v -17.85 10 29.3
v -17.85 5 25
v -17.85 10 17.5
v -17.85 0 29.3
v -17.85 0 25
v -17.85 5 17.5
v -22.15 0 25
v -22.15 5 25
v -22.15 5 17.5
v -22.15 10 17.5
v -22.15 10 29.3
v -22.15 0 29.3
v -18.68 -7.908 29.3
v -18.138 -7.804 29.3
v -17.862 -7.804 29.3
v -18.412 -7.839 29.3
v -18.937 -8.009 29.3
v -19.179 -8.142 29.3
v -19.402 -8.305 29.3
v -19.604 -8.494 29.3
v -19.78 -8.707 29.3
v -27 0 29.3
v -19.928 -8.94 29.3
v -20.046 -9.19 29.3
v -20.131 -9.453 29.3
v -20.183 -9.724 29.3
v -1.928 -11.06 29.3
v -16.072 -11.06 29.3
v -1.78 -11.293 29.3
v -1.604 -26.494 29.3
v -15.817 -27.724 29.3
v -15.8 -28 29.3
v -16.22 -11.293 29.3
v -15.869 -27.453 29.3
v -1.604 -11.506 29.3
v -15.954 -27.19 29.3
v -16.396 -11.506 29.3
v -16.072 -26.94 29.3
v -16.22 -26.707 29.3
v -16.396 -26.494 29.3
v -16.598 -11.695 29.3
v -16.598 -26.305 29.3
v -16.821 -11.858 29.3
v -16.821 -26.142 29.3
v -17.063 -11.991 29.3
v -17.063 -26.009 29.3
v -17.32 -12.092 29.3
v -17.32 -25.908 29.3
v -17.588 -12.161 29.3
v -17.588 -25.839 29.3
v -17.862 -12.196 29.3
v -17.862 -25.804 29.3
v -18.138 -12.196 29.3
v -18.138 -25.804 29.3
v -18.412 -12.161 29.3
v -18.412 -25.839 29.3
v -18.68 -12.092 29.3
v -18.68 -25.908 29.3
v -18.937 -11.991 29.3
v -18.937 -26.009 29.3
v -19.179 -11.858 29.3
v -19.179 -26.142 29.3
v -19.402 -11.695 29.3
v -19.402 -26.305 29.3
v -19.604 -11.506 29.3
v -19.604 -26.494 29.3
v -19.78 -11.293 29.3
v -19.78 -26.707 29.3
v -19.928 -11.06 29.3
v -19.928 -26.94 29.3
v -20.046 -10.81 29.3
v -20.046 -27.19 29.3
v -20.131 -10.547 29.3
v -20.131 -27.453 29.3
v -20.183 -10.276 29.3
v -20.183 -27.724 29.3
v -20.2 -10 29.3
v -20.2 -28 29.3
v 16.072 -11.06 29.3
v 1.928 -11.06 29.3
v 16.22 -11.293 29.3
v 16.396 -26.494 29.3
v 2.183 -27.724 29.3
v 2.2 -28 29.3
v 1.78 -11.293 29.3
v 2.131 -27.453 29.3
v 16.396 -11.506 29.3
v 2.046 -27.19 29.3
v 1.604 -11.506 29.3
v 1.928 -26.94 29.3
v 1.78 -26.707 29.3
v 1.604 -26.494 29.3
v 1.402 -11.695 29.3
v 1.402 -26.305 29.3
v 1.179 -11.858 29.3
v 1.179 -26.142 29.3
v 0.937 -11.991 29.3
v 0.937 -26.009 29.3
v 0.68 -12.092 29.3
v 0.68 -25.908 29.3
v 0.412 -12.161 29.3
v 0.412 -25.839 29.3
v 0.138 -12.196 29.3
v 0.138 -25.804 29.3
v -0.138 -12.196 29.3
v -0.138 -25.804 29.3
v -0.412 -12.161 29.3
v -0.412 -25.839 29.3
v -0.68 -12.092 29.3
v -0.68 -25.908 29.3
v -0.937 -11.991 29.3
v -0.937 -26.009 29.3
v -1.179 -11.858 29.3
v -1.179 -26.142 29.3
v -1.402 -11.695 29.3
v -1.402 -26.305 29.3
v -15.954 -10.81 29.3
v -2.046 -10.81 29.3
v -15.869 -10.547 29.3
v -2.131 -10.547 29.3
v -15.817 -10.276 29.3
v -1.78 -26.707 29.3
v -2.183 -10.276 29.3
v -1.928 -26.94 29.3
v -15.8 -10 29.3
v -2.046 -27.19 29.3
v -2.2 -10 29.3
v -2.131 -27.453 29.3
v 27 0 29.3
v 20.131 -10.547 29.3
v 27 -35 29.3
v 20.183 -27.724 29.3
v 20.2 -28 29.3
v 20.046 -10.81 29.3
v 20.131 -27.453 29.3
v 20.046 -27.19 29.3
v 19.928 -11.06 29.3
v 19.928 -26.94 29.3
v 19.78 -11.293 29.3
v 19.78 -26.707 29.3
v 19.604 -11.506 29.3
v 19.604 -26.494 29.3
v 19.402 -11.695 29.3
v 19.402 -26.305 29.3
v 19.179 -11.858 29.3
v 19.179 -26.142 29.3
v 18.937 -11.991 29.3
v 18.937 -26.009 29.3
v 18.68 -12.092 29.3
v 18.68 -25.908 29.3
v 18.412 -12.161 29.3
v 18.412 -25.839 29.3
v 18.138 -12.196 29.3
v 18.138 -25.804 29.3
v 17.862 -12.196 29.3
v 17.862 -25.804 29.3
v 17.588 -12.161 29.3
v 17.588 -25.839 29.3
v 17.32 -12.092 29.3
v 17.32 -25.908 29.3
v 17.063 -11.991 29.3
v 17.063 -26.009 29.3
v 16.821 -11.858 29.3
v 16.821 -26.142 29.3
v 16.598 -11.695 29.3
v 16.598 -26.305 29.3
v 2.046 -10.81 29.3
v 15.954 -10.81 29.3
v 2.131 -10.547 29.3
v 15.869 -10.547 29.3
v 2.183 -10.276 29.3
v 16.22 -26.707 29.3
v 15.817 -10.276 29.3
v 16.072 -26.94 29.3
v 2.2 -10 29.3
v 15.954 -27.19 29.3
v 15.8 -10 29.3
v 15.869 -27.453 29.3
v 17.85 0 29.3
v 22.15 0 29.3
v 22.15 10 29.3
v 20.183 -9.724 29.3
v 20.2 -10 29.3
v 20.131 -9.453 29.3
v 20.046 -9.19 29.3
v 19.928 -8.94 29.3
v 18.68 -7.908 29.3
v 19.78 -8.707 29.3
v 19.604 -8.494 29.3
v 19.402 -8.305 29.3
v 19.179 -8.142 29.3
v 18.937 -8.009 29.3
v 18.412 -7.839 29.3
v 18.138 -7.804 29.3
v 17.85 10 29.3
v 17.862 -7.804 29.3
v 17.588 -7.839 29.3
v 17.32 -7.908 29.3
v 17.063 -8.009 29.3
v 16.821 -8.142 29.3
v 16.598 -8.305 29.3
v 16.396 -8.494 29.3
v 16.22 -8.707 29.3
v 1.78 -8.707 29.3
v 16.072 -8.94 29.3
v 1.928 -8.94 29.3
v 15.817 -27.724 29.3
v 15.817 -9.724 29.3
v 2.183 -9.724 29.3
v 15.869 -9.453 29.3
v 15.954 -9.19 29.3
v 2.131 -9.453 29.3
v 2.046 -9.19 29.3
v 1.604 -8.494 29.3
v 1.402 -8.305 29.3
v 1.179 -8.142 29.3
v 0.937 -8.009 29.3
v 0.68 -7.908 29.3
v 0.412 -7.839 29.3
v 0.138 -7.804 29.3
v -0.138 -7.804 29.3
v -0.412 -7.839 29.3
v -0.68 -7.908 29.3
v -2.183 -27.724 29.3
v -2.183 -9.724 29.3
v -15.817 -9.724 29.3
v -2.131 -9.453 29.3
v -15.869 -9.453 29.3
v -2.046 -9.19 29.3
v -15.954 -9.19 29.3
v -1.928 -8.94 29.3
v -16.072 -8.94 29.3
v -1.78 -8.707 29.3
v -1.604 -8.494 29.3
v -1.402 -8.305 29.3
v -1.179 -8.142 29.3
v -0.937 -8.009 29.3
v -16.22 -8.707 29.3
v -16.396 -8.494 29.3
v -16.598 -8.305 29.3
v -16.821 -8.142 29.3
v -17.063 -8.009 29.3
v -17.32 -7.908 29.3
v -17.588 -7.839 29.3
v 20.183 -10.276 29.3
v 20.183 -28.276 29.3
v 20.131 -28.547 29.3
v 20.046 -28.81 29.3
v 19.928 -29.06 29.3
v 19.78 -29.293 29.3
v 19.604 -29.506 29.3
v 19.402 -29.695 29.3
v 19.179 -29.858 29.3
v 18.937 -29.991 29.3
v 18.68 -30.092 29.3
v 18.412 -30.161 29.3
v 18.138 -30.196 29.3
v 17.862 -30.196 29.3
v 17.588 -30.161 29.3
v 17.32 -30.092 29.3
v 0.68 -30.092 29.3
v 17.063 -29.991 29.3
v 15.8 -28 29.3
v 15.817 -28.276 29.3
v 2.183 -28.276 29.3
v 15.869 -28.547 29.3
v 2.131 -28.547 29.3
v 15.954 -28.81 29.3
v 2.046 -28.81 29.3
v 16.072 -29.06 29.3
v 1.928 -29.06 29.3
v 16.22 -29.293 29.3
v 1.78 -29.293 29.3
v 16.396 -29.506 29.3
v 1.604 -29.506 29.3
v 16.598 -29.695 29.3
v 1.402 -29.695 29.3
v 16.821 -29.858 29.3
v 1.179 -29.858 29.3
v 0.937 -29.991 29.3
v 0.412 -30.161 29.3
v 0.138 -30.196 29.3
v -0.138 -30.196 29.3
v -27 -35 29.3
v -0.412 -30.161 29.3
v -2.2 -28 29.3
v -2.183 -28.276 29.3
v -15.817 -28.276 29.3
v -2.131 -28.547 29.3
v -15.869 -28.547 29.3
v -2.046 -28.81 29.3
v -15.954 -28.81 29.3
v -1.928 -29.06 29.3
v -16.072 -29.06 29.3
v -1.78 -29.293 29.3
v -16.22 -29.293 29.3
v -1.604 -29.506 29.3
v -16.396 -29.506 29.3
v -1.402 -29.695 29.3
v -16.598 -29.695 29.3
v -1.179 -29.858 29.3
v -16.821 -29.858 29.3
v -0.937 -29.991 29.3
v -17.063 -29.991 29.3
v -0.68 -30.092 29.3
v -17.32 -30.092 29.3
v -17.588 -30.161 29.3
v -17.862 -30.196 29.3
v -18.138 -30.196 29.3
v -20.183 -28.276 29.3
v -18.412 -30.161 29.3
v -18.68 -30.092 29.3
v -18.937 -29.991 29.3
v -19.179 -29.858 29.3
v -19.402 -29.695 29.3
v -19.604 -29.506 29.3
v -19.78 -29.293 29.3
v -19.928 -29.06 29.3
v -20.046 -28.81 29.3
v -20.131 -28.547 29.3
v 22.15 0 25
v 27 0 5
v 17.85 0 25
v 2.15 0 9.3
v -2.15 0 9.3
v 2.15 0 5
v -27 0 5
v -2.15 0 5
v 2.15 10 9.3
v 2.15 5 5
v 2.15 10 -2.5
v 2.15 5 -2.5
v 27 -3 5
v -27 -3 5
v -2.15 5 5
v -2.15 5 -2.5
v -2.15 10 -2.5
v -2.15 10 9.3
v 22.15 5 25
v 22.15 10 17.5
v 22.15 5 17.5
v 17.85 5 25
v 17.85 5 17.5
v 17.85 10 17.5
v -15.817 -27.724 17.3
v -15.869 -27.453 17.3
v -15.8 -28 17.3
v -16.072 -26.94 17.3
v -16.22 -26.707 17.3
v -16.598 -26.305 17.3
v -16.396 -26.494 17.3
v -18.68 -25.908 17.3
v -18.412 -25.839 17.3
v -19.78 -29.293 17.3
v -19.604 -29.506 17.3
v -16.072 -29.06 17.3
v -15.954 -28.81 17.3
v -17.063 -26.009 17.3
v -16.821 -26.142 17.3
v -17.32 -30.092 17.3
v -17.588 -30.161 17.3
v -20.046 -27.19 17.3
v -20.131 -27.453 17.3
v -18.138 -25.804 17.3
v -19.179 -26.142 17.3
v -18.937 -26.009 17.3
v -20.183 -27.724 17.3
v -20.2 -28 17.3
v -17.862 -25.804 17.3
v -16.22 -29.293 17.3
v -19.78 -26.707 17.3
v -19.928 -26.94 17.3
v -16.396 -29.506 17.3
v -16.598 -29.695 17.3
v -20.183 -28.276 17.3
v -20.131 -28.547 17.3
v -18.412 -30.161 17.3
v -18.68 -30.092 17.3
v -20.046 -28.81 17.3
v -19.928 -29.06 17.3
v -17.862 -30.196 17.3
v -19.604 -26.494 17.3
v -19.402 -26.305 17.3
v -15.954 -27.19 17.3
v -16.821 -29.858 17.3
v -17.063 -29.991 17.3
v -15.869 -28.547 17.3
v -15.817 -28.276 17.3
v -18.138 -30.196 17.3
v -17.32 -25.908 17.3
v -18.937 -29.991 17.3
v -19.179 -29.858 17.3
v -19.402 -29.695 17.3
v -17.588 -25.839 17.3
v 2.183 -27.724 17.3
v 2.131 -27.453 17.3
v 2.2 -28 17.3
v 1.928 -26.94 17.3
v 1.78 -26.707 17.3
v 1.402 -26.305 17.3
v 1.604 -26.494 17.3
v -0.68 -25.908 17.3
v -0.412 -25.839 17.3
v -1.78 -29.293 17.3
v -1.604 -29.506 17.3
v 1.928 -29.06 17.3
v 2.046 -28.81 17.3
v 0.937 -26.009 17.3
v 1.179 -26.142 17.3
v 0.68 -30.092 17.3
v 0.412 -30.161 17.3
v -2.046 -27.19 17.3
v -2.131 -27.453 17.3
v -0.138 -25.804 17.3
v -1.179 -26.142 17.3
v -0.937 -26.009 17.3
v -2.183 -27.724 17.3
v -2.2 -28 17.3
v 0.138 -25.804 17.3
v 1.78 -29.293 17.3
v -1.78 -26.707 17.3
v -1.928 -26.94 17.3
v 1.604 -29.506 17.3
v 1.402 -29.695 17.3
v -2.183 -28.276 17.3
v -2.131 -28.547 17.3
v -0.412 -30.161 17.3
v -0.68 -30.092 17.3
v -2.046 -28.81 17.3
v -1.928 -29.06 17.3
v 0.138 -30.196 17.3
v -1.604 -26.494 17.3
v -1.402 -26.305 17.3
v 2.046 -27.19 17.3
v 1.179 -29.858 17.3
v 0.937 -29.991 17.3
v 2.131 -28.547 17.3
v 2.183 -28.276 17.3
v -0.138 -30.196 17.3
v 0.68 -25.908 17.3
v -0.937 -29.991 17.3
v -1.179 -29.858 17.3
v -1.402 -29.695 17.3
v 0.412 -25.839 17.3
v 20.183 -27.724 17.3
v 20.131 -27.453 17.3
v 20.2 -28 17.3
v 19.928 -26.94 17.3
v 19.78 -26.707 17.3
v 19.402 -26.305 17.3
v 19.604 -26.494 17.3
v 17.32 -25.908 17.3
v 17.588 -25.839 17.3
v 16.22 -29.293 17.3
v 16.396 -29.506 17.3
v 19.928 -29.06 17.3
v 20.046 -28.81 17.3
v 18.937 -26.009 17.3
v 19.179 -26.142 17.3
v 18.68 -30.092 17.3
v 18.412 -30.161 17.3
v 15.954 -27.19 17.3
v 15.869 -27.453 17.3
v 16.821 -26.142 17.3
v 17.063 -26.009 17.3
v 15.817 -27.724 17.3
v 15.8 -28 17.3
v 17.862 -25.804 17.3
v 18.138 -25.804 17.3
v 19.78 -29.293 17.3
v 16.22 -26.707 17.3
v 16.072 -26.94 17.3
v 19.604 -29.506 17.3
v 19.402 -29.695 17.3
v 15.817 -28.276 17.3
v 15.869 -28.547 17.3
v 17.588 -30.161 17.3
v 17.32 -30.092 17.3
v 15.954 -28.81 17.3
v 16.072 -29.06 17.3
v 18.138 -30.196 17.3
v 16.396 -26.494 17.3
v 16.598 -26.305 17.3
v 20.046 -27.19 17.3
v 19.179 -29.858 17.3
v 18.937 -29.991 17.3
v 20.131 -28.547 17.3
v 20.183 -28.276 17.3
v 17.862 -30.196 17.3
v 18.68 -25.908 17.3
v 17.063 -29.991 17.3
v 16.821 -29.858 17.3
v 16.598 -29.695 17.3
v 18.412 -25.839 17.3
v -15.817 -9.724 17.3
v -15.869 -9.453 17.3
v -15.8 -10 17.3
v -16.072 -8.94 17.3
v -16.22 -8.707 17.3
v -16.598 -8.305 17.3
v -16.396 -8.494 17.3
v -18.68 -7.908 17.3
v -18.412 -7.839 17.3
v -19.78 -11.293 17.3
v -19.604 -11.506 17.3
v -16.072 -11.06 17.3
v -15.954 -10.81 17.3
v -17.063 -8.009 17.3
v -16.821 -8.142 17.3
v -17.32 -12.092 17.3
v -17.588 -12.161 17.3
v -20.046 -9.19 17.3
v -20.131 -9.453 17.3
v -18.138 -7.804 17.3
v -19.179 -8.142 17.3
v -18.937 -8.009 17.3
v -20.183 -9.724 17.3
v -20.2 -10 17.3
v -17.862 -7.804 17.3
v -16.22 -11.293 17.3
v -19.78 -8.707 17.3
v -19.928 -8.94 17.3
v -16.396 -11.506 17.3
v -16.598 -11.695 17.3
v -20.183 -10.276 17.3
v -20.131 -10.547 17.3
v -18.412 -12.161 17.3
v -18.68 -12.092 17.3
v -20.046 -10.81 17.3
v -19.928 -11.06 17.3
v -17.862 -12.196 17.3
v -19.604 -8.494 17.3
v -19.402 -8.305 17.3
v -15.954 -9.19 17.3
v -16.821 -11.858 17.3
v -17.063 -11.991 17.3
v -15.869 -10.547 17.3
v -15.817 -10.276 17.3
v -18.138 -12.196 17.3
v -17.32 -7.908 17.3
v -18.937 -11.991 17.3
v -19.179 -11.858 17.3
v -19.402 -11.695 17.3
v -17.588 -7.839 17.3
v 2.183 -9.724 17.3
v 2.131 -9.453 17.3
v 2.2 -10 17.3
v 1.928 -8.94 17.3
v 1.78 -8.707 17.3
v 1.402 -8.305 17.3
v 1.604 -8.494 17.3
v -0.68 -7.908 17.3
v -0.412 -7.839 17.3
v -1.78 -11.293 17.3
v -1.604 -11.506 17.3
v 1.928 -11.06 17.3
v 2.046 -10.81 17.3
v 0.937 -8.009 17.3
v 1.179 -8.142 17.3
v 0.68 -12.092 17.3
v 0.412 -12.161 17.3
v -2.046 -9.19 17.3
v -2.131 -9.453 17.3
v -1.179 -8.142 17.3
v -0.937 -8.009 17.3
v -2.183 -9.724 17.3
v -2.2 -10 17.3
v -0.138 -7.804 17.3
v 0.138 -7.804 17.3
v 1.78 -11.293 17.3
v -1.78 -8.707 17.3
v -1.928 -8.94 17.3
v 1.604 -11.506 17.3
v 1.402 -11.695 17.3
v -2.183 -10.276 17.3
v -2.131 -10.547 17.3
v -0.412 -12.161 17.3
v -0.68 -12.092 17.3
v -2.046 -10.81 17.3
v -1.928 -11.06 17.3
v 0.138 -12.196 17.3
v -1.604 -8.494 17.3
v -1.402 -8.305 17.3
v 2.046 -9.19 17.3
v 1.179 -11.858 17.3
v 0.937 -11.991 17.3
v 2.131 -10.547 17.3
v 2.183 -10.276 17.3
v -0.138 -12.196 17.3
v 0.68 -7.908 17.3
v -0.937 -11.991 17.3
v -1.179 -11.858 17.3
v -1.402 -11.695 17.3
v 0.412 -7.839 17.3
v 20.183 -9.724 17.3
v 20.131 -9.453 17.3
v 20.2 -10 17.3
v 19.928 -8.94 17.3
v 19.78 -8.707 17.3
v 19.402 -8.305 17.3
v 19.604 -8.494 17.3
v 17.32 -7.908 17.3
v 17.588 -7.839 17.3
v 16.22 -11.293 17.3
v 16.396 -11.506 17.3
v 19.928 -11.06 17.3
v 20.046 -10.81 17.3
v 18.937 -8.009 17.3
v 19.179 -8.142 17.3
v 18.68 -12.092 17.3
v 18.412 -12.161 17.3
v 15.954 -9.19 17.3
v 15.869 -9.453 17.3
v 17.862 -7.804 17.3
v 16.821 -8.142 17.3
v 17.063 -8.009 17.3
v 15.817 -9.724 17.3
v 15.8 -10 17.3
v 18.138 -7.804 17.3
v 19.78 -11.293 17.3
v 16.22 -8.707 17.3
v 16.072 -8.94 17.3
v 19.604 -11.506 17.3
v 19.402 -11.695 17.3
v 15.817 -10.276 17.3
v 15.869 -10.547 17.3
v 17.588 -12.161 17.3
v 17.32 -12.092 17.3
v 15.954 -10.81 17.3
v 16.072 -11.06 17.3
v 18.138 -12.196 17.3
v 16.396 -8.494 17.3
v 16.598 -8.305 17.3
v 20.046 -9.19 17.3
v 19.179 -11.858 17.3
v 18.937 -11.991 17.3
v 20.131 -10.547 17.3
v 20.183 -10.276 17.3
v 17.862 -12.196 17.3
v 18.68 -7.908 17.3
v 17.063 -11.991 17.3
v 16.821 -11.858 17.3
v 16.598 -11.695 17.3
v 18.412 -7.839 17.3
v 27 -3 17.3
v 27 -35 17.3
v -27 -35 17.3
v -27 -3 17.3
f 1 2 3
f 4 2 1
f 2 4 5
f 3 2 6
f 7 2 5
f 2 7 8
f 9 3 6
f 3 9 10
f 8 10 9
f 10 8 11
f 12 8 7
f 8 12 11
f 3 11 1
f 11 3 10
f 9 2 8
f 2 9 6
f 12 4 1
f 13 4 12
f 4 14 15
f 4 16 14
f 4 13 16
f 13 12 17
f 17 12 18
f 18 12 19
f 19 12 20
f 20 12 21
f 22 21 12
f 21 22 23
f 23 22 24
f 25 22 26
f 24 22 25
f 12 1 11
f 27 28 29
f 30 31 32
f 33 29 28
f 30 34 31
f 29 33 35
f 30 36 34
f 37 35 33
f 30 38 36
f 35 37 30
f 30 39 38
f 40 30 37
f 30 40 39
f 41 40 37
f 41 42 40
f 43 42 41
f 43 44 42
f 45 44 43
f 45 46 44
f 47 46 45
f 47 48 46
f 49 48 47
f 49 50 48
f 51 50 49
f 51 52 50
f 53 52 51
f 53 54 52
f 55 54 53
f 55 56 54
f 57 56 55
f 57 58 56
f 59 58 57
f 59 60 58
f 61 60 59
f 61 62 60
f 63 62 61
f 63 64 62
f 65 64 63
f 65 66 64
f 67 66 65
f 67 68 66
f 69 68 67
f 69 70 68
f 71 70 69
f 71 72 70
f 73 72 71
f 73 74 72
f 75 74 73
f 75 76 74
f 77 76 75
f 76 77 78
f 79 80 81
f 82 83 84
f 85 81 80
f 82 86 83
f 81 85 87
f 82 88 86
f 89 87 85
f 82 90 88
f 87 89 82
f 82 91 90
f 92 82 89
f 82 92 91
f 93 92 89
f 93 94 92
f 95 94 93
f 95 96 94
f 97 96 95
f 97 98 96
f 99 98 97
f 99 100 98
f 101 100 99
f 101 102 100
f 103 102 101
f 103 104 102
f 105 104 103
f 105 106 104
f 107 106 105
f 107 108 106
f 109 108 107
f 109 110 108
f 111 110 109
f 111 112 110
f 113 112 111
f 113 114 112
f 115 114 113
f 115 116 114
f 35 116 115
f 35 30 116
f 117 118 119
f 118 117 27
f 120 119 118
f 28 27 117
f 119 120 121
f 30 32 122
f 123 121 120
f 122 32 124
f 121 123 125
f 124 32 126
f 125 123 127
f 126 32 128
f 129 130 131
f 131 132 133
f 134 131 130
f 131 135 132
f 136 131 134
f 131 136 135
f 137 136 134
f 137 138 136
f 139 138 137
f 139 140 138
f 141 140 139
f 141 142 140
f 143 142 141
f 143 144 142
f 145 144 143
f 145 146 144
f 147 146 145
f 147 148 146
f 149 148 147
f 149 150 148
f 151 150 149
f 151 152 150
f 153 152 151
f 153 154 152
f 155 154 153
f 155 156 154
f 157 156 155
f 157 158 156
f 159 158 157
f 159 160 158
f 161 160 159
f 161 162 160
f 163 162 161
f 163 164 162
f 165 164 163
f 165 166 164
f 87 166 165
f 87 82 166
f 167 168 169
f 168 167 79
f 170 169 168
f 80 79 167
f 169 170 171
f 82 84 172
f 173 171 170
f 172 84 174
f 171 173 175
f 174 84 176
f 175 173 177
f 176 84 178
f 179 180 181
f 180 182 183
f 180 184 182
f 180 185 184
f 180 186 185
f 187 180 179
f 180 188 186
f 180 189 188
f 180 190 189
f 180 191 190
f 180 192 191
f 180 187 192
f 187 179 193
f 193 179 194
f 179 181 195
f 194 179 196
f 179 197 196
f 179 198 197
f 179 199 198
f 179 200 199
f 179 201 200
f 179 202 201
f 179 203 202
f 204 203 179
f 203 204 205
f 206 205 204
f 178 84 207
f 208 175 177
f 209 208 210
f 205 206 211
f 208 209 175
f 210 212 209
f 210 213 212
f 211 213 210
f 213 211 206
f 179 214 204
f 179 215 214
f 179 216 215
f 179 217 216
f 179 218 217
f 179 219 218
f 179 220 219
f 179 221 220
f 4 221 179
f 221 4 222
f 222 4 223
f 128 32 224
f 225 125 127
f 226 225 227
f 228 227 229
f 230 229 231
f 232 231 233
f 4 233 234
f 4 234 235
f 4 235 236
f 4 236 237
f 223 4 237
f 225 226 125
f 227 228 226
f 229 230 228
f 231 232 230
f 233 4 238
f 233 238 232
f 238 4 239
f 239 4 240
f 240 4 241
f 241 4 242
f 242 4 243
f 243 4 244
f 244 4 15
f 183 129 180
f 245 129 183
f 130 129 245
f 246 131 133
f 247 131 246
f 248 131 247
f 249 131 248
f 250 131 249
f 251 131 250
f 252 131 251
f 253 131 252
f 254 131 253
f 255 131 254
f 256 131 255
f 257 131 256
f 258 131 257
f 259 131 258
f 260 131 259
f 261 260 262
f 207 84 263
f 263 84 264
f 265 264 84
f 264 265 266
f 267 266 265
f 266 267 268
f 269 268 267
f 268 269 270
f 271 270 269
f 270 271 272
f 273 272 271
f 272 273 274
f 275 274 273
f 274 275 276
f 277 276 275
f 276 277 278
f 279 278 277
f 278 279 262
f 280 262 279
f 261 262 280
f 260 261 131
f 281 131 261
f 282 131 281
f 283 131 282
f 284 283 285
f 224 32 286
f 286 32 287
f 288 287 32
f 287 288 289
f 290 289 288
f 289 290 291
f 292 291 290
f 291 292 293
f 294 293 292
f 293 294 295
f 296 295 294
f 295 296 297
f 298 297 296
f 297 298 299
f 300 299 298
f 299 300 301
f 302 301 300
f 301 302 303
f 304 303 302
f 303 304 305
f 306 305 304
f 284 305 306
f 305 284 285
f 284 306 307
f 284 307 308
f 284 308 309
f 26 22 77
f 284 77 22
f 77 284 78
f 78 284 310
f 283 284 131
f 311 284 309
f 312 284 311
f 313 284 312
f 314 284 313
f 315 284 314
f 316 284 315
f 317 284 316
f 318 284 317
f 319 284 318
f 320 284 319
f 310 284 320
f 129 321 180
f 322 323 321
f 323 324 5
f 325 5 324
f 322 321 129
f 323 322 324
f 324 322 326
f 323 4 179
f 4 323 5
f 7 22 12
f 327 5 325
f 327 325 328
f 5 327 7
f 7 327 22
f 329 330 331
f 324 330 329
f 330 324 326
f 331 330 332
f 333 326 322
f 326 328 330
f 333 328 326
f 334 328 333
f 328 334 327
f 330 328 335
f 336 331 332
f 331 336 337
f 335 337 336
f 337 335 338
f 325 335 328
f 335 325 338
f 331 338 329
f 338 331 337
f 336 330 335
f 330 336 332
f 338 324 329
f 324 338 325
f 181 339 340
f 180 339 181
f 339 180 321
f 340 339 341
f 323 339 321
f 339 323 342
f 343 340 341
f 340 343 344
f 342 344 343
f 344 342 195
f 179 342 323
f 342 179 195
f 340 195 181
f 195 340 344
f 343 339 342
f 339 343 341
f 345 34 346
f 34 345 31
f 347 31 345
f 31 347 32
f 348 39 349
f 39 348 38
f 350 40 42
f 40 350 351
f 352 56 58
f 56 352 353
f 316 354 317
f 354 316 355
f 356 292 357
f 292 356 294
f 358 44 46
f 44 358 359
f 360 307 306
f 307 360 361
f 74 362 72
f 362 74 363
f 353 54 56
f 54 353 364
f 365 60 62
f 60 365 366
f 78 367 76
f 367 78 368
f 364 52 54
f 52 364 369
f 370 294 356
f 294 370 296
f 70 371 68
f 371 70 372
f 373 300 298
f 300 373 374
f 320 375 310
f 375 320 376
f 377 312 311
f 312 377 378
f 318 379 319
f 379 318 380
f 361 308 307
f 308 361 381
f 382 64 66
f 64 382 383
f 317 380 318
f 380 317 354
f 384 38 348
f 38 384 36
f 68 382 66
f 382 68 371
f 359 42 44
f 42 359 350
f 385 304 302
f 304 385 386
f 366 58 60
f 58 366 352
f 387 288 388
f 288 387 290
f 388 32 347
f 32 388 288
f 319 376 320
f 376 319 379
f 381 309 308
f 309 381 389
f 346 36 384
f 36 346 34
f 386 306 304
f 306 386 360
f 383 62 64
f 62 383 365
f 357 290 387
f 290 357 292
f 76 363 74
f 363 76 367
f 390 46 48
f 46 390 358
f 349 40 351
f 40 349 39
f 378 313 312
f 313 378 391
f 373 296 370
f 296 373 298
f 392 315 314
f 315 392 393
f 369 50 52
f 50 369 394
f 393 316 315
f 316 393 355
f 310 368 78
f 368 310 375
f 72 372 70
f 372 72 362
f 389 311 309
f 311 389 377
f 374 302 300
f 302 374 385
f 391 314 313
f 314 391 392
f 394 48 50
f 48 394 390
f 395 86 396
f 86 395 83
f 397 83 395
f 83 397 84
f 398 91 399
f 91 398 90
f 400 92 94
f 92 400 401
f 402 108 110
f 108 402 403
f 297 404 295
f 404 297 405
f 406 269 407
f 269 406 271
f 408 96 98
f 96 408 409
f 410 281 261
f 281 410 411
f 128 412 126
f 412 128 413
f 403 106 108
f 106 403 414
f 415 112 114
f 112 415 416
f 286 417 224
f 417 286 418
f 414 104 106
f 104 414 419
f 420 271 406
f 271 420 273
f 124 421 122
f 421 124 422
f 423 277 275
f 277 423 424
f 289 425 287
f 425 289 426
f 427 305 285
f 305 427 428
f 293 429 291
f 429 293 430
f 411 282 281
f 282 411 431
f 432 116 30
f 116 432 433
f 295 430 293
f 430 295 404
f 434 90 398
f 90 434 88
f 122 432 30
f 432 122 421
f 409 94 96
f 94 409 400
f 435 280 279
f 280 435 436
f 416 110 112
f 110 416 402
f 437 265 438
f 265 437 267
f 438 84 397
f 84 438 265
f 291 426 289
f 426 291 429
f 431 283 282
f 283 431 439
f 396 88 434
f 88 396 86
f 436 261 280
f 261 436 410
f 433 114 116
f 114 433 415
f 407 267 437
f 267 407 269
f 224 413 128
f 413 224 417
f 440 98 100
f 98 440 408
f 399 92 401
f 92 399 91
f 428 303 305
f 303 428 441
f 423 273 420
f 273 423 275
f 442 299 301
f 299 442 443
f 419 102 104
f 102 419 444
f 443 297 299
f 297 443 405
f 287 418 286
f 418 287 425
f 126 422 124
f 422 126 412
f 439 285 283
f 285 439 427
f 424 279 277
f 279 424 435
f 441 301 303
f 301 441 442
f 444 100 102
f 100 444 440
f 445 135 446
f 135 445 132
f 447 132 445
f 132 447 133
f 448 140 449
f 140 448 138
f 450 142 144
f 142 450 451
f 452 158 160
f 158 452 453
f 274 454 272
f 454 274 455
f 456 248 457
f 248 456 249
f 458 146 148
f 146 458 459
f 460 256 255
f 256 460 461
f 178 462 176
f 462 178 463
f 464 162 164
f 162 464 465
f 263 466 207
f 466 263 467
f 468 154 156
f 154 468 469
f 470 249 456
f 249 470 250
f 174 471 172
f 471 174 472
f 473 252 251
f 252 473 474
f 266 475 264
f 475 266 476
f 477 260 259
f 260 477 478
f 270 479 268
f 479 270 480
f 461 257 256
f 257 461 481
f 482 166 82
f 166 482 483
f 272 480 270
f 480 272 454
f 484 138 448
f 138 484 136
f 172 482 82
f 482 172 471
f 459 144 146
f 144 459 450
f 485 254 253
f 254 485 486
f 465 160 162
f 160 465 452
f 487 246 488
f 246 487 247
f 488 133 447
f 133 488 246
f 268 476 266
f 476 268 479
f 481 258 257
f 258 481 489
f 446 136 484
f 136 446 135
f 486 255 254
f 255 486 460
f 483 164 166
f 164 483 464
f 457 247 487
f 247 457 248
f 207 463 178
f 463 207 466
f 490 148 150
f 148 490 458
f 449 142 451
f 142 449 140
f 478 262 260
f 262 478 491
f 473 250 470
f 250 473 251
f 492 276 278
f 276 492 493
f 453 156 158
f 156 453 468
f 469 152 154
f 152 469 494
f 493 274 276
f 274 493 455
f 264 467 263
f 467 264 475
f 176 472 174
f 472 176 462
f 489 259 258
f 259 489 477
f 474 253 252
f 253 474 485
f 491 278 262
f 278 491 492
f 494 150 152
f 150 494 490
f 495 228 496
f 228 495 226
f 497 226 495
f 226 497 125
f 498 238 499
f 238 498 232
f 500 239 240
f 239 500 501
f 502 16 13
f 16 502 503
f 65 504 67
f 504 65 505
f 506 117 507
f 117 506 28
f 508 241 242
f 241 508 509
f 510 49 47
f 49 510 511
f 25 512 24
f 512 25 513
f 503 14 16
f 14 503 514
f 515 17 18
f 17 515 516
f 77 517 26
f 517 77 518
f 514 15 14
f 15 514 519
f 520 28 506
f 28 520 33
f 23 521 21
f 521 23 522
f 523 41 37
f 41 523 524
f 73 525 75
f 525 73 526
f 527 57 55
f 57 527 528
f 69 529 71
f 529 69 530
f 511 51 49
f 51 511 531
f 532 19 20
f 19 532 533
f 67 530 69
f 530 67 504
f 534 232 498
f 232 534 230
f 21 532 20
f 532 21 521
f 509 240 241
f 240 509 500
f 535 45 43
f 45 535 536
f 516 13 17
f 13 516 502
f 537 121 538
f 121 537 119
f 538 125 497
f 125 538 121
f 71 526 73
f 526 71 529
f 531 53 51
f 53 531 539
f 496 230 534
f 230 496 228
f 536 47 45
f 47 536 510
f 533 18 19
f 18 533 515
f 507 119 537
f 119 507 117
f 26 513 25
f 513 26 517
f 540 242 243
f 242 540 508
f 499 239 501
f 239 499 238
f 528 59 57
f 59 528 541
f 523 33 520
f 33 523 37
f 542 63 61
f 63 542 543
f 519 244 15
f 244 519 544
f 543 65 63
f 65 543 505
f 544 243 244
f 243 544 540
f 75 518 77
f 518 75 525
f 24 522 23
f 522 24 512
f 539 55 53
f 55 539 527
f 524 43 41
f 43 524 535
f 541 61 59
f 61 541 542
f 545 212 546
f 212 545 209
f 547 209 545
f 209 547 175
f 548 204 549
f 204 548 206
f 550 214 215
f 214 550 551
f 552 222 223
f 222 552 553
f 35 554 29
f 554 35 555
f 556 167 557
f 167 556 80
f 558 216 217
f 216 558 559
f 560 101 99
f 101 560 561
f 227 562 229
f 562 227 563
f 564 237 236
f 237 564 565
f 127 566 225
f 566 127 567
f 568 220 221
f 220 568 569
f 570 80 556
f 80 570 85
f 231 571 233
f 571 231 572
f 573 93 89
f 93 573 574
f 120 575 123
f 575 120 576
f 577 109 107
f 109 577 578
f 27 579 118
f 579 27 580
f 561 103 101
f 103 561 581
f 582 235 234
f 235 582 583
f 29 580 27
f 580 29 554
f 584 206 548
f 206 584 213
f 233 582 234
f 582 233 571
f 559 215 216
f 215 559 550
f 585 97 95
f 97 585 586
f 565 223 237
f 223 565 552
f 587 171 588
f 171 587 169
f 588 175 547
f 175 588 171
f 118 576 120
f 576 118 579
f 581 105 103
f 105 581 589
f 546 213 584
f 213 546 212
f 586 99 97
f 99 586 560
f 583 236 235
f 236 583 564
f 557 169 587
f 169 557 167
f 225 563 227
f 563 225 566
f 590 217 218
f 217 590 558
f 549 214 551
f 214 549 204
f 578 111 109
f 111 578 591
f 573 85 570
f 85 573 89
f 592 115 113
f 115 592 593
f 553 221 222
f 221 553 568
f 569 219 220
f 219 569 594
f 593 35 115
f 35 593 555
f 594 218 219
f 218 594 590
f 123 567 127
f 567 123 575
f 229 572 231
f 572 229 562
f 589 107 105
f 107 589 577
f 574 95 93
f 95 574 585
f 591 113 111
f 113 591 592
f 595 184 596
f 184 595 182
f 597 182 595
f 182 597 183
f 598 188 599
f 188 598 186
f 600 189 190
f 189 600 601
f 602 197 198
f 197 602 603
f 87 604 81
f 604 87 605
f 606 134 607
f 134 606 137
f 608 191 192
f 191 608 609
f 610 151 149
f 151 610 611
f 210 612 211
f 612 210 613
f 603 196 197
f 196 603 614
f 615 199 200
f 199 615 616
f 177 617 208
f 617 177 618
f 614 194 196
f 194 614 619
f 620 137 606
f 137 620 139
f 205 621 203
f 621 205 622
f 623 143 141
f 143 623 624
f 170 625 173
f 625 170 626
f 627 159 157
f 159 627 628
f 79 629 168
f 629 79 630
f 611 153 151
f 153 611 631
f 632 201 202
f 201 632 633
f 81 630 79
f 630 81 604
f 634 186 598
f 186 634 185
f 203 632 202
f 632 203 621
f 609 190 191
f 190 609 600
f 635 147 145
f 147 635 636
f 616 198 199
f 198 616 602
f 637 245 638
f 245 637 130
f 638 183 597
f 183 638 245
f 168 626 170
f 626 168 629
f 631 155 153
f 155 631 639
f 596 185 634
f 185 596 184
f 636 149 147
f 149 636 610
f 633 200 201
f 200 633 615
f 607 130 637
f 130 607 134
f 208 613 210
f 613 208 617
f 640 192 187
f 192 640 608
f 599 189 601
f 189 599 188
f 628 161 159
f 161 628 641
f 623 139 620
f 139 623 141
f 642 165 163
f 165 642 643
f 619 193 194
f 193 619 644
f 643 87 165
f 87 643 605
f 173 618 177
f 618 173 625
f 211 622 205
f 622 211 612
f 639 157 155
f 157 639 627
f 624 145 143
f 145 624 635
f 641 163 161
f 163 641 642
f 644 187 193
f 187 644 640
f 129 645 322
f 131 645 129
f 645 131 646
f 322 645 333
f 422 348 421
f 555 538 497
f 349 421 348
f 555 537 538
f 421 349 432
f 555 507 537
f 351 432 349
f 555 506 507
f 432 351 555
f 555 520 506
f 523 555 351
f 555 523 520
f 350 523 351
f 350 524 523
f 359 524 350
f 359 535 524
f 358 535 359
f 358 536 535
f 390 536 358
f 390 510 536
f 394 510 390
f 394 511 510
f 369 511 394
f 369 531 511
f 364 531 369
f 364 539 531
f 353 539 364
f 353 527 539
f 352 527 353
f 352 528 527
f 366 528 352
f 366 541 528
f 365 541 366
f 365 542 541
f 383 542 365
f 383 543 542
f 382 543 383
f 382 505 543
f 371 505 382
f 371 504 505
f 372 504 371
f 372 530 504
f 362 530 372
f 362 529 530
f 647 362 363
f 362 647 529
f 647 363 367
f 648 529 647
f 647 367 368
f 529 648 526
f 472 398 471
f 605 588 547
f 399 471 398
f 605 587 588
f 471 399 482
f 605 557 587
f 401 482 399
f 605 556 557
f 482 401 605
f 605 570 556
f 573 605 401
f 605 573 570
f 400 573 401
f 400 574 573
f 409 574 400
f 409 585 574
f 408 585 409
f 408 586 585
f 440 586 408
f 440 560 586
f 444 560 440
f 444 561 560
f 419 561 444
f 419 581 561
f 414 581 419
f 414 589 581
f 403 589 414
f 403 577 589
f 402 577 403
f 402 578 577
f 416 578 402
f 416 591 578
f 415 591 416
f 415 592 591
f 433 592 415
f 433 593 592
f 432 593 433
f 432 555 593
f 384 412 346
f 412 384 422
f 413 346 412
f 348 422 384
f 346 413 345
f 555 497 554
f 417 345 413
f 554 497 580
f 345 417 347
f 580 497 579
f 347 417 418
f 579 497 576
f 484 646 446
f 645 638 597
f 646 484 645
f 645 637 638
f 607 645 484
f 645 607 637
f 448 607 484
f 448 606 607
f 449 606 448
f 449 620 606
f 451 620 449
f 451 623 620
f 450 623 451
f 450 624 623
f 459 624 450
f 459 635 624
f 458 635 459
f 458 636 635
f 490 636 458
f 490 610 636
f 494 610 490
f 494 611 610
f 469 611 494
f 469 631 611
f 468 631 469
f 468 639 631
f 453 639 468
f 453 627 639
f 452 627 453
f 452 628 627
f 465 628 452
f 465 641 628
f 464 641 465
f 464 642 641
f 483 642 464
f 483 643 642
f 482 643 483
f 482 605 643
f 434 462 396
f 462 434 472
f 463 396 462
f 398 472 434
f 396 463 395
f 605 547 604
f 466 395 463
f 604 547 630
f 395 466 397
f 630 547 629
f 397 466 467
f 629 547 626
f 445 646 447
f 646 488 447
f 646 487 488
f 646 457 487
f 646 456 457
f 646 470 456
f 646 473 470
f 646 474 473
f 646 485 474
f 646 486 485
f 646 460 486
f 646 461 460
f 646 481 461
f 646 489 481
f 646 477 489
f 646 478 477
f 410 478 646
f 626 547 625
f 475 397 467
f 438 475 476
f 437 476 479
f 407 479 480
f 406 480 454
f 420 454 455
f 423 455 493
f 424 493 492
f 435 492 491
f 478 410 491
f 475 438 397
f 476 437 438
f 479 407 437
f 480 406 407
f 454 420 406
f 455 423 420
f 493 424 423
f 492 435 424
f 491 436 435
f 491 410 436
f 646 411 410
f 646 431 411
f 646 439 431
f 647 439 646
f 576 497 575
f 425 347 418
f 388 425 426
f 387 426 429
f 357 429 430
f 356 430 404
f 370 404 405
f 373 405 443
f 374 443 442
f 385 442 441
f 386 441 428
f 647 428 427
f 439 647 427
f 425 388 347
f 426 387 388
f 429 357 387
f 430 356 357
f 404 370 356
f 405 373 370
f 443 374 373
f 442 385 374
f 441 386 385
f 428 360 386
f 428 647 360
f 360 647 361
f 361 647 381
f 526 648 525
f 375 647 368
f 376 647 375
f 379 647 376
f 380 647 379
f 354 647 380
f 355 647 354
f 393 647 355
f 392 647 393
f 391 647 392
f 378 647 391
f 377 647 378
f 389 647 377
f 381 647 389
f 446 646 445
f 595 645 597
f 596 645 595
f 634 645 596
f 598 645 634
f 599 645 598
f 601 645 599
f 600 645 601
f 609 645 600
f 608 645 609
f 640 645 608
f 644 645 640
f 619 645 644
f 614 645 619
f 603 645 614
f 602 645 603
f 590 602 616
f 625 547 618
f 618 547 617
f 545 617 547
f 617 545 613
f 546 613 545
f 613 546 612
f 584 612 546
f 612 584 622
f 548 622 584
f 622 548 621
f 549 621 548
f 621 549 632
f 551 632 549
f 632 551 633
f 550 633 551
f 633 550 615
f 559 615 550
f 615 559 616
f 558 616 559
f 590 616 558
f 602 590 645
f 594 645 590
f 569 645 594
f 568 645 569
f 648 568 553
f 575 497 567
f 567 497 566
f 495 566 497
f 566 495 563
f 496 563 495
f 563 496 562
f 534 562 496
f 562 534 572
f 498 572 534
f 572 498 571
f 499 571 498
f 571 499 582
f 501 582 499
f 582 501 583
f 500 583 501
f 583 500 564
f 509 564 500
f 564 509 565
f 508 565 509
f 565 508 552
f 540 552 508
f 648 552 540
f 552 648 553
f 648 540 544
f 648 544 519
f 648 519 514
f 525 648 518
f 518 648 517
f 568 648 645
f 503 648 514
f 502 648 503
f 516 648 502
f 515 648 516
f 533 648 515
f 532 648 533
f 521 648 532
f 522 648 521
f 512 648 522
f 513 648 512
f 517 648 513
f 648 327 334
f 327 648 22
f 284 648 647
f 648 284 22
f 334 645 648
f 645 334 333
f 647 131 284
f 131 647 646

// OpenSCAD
// file: ../../modules/skadis.scad
ikea_skadis_hole_w = 4.3;
ikea_skadis_hook_depth = 5;
ikea_skadis_hole_h = 7.5;
ikea_skadis_holes_dist = 80;
ikea_skadis_holes_horiz_dist = 40;

module skadis_hook() {
    color("green")
    translate([0,ikea_skadis_hook_depth,-ikea_skadis_hole_h]) cube([ikea_skadis_hole_w,ikea_skadis_hook_depth,ikea_skadis_hole_h ]);

    color("violet")
    translate([0,0,0]) cube([ikea_skadis_hole_w,ikea_skadis_hook_depth*2,ikea_skadis_hole_w ]);
}

module skadis_double_hooks() {
    skadis_hook();
    
    translate([0,0,ikea_skadis_holes_dist]) skadis_hook();
    
    color("yellow")
    translate([0,-ikea_skadis_hook_depth,0])
    cube([ikea_skadis_hole_w,ikea_skadis_hook_depth,ikea_skadis_holes_dist + ikea_skadis_hole_w]);
}

module skadis_triple_horiz_hooks() {
    translate([-20 - ikea_skadis_hole_w / 2,0,0]) union() {
        skadis_hook();
        translate([20,0,-20]) skadis_hook();
        translate([40,0,0]) skadis_hook();
    }
}

//skadis_double_hooks();
//skadis_triple_horiz_hooks();
// main file
include <../../modules/skadis.scad>;

w = 18 * 3;

translate([-w/2,-3,5]) cube([w,3,24.3]);

translate([0,0,25]) skadis_triple_horiz_hooks();

difference() {
    translate([-w/2,-35,17.3]) cube([w, 32, 12]);
    for (y = [0:1:1]) {
        for (x = [0:1:2]) {  
            translate([x * 18 - w/2 + 18 / 2, y * 18 - 28, 0]) 
            cylinder(50,r1 = 2.2, r2 = 2.2, $fn = 50);
        }
    }
}
